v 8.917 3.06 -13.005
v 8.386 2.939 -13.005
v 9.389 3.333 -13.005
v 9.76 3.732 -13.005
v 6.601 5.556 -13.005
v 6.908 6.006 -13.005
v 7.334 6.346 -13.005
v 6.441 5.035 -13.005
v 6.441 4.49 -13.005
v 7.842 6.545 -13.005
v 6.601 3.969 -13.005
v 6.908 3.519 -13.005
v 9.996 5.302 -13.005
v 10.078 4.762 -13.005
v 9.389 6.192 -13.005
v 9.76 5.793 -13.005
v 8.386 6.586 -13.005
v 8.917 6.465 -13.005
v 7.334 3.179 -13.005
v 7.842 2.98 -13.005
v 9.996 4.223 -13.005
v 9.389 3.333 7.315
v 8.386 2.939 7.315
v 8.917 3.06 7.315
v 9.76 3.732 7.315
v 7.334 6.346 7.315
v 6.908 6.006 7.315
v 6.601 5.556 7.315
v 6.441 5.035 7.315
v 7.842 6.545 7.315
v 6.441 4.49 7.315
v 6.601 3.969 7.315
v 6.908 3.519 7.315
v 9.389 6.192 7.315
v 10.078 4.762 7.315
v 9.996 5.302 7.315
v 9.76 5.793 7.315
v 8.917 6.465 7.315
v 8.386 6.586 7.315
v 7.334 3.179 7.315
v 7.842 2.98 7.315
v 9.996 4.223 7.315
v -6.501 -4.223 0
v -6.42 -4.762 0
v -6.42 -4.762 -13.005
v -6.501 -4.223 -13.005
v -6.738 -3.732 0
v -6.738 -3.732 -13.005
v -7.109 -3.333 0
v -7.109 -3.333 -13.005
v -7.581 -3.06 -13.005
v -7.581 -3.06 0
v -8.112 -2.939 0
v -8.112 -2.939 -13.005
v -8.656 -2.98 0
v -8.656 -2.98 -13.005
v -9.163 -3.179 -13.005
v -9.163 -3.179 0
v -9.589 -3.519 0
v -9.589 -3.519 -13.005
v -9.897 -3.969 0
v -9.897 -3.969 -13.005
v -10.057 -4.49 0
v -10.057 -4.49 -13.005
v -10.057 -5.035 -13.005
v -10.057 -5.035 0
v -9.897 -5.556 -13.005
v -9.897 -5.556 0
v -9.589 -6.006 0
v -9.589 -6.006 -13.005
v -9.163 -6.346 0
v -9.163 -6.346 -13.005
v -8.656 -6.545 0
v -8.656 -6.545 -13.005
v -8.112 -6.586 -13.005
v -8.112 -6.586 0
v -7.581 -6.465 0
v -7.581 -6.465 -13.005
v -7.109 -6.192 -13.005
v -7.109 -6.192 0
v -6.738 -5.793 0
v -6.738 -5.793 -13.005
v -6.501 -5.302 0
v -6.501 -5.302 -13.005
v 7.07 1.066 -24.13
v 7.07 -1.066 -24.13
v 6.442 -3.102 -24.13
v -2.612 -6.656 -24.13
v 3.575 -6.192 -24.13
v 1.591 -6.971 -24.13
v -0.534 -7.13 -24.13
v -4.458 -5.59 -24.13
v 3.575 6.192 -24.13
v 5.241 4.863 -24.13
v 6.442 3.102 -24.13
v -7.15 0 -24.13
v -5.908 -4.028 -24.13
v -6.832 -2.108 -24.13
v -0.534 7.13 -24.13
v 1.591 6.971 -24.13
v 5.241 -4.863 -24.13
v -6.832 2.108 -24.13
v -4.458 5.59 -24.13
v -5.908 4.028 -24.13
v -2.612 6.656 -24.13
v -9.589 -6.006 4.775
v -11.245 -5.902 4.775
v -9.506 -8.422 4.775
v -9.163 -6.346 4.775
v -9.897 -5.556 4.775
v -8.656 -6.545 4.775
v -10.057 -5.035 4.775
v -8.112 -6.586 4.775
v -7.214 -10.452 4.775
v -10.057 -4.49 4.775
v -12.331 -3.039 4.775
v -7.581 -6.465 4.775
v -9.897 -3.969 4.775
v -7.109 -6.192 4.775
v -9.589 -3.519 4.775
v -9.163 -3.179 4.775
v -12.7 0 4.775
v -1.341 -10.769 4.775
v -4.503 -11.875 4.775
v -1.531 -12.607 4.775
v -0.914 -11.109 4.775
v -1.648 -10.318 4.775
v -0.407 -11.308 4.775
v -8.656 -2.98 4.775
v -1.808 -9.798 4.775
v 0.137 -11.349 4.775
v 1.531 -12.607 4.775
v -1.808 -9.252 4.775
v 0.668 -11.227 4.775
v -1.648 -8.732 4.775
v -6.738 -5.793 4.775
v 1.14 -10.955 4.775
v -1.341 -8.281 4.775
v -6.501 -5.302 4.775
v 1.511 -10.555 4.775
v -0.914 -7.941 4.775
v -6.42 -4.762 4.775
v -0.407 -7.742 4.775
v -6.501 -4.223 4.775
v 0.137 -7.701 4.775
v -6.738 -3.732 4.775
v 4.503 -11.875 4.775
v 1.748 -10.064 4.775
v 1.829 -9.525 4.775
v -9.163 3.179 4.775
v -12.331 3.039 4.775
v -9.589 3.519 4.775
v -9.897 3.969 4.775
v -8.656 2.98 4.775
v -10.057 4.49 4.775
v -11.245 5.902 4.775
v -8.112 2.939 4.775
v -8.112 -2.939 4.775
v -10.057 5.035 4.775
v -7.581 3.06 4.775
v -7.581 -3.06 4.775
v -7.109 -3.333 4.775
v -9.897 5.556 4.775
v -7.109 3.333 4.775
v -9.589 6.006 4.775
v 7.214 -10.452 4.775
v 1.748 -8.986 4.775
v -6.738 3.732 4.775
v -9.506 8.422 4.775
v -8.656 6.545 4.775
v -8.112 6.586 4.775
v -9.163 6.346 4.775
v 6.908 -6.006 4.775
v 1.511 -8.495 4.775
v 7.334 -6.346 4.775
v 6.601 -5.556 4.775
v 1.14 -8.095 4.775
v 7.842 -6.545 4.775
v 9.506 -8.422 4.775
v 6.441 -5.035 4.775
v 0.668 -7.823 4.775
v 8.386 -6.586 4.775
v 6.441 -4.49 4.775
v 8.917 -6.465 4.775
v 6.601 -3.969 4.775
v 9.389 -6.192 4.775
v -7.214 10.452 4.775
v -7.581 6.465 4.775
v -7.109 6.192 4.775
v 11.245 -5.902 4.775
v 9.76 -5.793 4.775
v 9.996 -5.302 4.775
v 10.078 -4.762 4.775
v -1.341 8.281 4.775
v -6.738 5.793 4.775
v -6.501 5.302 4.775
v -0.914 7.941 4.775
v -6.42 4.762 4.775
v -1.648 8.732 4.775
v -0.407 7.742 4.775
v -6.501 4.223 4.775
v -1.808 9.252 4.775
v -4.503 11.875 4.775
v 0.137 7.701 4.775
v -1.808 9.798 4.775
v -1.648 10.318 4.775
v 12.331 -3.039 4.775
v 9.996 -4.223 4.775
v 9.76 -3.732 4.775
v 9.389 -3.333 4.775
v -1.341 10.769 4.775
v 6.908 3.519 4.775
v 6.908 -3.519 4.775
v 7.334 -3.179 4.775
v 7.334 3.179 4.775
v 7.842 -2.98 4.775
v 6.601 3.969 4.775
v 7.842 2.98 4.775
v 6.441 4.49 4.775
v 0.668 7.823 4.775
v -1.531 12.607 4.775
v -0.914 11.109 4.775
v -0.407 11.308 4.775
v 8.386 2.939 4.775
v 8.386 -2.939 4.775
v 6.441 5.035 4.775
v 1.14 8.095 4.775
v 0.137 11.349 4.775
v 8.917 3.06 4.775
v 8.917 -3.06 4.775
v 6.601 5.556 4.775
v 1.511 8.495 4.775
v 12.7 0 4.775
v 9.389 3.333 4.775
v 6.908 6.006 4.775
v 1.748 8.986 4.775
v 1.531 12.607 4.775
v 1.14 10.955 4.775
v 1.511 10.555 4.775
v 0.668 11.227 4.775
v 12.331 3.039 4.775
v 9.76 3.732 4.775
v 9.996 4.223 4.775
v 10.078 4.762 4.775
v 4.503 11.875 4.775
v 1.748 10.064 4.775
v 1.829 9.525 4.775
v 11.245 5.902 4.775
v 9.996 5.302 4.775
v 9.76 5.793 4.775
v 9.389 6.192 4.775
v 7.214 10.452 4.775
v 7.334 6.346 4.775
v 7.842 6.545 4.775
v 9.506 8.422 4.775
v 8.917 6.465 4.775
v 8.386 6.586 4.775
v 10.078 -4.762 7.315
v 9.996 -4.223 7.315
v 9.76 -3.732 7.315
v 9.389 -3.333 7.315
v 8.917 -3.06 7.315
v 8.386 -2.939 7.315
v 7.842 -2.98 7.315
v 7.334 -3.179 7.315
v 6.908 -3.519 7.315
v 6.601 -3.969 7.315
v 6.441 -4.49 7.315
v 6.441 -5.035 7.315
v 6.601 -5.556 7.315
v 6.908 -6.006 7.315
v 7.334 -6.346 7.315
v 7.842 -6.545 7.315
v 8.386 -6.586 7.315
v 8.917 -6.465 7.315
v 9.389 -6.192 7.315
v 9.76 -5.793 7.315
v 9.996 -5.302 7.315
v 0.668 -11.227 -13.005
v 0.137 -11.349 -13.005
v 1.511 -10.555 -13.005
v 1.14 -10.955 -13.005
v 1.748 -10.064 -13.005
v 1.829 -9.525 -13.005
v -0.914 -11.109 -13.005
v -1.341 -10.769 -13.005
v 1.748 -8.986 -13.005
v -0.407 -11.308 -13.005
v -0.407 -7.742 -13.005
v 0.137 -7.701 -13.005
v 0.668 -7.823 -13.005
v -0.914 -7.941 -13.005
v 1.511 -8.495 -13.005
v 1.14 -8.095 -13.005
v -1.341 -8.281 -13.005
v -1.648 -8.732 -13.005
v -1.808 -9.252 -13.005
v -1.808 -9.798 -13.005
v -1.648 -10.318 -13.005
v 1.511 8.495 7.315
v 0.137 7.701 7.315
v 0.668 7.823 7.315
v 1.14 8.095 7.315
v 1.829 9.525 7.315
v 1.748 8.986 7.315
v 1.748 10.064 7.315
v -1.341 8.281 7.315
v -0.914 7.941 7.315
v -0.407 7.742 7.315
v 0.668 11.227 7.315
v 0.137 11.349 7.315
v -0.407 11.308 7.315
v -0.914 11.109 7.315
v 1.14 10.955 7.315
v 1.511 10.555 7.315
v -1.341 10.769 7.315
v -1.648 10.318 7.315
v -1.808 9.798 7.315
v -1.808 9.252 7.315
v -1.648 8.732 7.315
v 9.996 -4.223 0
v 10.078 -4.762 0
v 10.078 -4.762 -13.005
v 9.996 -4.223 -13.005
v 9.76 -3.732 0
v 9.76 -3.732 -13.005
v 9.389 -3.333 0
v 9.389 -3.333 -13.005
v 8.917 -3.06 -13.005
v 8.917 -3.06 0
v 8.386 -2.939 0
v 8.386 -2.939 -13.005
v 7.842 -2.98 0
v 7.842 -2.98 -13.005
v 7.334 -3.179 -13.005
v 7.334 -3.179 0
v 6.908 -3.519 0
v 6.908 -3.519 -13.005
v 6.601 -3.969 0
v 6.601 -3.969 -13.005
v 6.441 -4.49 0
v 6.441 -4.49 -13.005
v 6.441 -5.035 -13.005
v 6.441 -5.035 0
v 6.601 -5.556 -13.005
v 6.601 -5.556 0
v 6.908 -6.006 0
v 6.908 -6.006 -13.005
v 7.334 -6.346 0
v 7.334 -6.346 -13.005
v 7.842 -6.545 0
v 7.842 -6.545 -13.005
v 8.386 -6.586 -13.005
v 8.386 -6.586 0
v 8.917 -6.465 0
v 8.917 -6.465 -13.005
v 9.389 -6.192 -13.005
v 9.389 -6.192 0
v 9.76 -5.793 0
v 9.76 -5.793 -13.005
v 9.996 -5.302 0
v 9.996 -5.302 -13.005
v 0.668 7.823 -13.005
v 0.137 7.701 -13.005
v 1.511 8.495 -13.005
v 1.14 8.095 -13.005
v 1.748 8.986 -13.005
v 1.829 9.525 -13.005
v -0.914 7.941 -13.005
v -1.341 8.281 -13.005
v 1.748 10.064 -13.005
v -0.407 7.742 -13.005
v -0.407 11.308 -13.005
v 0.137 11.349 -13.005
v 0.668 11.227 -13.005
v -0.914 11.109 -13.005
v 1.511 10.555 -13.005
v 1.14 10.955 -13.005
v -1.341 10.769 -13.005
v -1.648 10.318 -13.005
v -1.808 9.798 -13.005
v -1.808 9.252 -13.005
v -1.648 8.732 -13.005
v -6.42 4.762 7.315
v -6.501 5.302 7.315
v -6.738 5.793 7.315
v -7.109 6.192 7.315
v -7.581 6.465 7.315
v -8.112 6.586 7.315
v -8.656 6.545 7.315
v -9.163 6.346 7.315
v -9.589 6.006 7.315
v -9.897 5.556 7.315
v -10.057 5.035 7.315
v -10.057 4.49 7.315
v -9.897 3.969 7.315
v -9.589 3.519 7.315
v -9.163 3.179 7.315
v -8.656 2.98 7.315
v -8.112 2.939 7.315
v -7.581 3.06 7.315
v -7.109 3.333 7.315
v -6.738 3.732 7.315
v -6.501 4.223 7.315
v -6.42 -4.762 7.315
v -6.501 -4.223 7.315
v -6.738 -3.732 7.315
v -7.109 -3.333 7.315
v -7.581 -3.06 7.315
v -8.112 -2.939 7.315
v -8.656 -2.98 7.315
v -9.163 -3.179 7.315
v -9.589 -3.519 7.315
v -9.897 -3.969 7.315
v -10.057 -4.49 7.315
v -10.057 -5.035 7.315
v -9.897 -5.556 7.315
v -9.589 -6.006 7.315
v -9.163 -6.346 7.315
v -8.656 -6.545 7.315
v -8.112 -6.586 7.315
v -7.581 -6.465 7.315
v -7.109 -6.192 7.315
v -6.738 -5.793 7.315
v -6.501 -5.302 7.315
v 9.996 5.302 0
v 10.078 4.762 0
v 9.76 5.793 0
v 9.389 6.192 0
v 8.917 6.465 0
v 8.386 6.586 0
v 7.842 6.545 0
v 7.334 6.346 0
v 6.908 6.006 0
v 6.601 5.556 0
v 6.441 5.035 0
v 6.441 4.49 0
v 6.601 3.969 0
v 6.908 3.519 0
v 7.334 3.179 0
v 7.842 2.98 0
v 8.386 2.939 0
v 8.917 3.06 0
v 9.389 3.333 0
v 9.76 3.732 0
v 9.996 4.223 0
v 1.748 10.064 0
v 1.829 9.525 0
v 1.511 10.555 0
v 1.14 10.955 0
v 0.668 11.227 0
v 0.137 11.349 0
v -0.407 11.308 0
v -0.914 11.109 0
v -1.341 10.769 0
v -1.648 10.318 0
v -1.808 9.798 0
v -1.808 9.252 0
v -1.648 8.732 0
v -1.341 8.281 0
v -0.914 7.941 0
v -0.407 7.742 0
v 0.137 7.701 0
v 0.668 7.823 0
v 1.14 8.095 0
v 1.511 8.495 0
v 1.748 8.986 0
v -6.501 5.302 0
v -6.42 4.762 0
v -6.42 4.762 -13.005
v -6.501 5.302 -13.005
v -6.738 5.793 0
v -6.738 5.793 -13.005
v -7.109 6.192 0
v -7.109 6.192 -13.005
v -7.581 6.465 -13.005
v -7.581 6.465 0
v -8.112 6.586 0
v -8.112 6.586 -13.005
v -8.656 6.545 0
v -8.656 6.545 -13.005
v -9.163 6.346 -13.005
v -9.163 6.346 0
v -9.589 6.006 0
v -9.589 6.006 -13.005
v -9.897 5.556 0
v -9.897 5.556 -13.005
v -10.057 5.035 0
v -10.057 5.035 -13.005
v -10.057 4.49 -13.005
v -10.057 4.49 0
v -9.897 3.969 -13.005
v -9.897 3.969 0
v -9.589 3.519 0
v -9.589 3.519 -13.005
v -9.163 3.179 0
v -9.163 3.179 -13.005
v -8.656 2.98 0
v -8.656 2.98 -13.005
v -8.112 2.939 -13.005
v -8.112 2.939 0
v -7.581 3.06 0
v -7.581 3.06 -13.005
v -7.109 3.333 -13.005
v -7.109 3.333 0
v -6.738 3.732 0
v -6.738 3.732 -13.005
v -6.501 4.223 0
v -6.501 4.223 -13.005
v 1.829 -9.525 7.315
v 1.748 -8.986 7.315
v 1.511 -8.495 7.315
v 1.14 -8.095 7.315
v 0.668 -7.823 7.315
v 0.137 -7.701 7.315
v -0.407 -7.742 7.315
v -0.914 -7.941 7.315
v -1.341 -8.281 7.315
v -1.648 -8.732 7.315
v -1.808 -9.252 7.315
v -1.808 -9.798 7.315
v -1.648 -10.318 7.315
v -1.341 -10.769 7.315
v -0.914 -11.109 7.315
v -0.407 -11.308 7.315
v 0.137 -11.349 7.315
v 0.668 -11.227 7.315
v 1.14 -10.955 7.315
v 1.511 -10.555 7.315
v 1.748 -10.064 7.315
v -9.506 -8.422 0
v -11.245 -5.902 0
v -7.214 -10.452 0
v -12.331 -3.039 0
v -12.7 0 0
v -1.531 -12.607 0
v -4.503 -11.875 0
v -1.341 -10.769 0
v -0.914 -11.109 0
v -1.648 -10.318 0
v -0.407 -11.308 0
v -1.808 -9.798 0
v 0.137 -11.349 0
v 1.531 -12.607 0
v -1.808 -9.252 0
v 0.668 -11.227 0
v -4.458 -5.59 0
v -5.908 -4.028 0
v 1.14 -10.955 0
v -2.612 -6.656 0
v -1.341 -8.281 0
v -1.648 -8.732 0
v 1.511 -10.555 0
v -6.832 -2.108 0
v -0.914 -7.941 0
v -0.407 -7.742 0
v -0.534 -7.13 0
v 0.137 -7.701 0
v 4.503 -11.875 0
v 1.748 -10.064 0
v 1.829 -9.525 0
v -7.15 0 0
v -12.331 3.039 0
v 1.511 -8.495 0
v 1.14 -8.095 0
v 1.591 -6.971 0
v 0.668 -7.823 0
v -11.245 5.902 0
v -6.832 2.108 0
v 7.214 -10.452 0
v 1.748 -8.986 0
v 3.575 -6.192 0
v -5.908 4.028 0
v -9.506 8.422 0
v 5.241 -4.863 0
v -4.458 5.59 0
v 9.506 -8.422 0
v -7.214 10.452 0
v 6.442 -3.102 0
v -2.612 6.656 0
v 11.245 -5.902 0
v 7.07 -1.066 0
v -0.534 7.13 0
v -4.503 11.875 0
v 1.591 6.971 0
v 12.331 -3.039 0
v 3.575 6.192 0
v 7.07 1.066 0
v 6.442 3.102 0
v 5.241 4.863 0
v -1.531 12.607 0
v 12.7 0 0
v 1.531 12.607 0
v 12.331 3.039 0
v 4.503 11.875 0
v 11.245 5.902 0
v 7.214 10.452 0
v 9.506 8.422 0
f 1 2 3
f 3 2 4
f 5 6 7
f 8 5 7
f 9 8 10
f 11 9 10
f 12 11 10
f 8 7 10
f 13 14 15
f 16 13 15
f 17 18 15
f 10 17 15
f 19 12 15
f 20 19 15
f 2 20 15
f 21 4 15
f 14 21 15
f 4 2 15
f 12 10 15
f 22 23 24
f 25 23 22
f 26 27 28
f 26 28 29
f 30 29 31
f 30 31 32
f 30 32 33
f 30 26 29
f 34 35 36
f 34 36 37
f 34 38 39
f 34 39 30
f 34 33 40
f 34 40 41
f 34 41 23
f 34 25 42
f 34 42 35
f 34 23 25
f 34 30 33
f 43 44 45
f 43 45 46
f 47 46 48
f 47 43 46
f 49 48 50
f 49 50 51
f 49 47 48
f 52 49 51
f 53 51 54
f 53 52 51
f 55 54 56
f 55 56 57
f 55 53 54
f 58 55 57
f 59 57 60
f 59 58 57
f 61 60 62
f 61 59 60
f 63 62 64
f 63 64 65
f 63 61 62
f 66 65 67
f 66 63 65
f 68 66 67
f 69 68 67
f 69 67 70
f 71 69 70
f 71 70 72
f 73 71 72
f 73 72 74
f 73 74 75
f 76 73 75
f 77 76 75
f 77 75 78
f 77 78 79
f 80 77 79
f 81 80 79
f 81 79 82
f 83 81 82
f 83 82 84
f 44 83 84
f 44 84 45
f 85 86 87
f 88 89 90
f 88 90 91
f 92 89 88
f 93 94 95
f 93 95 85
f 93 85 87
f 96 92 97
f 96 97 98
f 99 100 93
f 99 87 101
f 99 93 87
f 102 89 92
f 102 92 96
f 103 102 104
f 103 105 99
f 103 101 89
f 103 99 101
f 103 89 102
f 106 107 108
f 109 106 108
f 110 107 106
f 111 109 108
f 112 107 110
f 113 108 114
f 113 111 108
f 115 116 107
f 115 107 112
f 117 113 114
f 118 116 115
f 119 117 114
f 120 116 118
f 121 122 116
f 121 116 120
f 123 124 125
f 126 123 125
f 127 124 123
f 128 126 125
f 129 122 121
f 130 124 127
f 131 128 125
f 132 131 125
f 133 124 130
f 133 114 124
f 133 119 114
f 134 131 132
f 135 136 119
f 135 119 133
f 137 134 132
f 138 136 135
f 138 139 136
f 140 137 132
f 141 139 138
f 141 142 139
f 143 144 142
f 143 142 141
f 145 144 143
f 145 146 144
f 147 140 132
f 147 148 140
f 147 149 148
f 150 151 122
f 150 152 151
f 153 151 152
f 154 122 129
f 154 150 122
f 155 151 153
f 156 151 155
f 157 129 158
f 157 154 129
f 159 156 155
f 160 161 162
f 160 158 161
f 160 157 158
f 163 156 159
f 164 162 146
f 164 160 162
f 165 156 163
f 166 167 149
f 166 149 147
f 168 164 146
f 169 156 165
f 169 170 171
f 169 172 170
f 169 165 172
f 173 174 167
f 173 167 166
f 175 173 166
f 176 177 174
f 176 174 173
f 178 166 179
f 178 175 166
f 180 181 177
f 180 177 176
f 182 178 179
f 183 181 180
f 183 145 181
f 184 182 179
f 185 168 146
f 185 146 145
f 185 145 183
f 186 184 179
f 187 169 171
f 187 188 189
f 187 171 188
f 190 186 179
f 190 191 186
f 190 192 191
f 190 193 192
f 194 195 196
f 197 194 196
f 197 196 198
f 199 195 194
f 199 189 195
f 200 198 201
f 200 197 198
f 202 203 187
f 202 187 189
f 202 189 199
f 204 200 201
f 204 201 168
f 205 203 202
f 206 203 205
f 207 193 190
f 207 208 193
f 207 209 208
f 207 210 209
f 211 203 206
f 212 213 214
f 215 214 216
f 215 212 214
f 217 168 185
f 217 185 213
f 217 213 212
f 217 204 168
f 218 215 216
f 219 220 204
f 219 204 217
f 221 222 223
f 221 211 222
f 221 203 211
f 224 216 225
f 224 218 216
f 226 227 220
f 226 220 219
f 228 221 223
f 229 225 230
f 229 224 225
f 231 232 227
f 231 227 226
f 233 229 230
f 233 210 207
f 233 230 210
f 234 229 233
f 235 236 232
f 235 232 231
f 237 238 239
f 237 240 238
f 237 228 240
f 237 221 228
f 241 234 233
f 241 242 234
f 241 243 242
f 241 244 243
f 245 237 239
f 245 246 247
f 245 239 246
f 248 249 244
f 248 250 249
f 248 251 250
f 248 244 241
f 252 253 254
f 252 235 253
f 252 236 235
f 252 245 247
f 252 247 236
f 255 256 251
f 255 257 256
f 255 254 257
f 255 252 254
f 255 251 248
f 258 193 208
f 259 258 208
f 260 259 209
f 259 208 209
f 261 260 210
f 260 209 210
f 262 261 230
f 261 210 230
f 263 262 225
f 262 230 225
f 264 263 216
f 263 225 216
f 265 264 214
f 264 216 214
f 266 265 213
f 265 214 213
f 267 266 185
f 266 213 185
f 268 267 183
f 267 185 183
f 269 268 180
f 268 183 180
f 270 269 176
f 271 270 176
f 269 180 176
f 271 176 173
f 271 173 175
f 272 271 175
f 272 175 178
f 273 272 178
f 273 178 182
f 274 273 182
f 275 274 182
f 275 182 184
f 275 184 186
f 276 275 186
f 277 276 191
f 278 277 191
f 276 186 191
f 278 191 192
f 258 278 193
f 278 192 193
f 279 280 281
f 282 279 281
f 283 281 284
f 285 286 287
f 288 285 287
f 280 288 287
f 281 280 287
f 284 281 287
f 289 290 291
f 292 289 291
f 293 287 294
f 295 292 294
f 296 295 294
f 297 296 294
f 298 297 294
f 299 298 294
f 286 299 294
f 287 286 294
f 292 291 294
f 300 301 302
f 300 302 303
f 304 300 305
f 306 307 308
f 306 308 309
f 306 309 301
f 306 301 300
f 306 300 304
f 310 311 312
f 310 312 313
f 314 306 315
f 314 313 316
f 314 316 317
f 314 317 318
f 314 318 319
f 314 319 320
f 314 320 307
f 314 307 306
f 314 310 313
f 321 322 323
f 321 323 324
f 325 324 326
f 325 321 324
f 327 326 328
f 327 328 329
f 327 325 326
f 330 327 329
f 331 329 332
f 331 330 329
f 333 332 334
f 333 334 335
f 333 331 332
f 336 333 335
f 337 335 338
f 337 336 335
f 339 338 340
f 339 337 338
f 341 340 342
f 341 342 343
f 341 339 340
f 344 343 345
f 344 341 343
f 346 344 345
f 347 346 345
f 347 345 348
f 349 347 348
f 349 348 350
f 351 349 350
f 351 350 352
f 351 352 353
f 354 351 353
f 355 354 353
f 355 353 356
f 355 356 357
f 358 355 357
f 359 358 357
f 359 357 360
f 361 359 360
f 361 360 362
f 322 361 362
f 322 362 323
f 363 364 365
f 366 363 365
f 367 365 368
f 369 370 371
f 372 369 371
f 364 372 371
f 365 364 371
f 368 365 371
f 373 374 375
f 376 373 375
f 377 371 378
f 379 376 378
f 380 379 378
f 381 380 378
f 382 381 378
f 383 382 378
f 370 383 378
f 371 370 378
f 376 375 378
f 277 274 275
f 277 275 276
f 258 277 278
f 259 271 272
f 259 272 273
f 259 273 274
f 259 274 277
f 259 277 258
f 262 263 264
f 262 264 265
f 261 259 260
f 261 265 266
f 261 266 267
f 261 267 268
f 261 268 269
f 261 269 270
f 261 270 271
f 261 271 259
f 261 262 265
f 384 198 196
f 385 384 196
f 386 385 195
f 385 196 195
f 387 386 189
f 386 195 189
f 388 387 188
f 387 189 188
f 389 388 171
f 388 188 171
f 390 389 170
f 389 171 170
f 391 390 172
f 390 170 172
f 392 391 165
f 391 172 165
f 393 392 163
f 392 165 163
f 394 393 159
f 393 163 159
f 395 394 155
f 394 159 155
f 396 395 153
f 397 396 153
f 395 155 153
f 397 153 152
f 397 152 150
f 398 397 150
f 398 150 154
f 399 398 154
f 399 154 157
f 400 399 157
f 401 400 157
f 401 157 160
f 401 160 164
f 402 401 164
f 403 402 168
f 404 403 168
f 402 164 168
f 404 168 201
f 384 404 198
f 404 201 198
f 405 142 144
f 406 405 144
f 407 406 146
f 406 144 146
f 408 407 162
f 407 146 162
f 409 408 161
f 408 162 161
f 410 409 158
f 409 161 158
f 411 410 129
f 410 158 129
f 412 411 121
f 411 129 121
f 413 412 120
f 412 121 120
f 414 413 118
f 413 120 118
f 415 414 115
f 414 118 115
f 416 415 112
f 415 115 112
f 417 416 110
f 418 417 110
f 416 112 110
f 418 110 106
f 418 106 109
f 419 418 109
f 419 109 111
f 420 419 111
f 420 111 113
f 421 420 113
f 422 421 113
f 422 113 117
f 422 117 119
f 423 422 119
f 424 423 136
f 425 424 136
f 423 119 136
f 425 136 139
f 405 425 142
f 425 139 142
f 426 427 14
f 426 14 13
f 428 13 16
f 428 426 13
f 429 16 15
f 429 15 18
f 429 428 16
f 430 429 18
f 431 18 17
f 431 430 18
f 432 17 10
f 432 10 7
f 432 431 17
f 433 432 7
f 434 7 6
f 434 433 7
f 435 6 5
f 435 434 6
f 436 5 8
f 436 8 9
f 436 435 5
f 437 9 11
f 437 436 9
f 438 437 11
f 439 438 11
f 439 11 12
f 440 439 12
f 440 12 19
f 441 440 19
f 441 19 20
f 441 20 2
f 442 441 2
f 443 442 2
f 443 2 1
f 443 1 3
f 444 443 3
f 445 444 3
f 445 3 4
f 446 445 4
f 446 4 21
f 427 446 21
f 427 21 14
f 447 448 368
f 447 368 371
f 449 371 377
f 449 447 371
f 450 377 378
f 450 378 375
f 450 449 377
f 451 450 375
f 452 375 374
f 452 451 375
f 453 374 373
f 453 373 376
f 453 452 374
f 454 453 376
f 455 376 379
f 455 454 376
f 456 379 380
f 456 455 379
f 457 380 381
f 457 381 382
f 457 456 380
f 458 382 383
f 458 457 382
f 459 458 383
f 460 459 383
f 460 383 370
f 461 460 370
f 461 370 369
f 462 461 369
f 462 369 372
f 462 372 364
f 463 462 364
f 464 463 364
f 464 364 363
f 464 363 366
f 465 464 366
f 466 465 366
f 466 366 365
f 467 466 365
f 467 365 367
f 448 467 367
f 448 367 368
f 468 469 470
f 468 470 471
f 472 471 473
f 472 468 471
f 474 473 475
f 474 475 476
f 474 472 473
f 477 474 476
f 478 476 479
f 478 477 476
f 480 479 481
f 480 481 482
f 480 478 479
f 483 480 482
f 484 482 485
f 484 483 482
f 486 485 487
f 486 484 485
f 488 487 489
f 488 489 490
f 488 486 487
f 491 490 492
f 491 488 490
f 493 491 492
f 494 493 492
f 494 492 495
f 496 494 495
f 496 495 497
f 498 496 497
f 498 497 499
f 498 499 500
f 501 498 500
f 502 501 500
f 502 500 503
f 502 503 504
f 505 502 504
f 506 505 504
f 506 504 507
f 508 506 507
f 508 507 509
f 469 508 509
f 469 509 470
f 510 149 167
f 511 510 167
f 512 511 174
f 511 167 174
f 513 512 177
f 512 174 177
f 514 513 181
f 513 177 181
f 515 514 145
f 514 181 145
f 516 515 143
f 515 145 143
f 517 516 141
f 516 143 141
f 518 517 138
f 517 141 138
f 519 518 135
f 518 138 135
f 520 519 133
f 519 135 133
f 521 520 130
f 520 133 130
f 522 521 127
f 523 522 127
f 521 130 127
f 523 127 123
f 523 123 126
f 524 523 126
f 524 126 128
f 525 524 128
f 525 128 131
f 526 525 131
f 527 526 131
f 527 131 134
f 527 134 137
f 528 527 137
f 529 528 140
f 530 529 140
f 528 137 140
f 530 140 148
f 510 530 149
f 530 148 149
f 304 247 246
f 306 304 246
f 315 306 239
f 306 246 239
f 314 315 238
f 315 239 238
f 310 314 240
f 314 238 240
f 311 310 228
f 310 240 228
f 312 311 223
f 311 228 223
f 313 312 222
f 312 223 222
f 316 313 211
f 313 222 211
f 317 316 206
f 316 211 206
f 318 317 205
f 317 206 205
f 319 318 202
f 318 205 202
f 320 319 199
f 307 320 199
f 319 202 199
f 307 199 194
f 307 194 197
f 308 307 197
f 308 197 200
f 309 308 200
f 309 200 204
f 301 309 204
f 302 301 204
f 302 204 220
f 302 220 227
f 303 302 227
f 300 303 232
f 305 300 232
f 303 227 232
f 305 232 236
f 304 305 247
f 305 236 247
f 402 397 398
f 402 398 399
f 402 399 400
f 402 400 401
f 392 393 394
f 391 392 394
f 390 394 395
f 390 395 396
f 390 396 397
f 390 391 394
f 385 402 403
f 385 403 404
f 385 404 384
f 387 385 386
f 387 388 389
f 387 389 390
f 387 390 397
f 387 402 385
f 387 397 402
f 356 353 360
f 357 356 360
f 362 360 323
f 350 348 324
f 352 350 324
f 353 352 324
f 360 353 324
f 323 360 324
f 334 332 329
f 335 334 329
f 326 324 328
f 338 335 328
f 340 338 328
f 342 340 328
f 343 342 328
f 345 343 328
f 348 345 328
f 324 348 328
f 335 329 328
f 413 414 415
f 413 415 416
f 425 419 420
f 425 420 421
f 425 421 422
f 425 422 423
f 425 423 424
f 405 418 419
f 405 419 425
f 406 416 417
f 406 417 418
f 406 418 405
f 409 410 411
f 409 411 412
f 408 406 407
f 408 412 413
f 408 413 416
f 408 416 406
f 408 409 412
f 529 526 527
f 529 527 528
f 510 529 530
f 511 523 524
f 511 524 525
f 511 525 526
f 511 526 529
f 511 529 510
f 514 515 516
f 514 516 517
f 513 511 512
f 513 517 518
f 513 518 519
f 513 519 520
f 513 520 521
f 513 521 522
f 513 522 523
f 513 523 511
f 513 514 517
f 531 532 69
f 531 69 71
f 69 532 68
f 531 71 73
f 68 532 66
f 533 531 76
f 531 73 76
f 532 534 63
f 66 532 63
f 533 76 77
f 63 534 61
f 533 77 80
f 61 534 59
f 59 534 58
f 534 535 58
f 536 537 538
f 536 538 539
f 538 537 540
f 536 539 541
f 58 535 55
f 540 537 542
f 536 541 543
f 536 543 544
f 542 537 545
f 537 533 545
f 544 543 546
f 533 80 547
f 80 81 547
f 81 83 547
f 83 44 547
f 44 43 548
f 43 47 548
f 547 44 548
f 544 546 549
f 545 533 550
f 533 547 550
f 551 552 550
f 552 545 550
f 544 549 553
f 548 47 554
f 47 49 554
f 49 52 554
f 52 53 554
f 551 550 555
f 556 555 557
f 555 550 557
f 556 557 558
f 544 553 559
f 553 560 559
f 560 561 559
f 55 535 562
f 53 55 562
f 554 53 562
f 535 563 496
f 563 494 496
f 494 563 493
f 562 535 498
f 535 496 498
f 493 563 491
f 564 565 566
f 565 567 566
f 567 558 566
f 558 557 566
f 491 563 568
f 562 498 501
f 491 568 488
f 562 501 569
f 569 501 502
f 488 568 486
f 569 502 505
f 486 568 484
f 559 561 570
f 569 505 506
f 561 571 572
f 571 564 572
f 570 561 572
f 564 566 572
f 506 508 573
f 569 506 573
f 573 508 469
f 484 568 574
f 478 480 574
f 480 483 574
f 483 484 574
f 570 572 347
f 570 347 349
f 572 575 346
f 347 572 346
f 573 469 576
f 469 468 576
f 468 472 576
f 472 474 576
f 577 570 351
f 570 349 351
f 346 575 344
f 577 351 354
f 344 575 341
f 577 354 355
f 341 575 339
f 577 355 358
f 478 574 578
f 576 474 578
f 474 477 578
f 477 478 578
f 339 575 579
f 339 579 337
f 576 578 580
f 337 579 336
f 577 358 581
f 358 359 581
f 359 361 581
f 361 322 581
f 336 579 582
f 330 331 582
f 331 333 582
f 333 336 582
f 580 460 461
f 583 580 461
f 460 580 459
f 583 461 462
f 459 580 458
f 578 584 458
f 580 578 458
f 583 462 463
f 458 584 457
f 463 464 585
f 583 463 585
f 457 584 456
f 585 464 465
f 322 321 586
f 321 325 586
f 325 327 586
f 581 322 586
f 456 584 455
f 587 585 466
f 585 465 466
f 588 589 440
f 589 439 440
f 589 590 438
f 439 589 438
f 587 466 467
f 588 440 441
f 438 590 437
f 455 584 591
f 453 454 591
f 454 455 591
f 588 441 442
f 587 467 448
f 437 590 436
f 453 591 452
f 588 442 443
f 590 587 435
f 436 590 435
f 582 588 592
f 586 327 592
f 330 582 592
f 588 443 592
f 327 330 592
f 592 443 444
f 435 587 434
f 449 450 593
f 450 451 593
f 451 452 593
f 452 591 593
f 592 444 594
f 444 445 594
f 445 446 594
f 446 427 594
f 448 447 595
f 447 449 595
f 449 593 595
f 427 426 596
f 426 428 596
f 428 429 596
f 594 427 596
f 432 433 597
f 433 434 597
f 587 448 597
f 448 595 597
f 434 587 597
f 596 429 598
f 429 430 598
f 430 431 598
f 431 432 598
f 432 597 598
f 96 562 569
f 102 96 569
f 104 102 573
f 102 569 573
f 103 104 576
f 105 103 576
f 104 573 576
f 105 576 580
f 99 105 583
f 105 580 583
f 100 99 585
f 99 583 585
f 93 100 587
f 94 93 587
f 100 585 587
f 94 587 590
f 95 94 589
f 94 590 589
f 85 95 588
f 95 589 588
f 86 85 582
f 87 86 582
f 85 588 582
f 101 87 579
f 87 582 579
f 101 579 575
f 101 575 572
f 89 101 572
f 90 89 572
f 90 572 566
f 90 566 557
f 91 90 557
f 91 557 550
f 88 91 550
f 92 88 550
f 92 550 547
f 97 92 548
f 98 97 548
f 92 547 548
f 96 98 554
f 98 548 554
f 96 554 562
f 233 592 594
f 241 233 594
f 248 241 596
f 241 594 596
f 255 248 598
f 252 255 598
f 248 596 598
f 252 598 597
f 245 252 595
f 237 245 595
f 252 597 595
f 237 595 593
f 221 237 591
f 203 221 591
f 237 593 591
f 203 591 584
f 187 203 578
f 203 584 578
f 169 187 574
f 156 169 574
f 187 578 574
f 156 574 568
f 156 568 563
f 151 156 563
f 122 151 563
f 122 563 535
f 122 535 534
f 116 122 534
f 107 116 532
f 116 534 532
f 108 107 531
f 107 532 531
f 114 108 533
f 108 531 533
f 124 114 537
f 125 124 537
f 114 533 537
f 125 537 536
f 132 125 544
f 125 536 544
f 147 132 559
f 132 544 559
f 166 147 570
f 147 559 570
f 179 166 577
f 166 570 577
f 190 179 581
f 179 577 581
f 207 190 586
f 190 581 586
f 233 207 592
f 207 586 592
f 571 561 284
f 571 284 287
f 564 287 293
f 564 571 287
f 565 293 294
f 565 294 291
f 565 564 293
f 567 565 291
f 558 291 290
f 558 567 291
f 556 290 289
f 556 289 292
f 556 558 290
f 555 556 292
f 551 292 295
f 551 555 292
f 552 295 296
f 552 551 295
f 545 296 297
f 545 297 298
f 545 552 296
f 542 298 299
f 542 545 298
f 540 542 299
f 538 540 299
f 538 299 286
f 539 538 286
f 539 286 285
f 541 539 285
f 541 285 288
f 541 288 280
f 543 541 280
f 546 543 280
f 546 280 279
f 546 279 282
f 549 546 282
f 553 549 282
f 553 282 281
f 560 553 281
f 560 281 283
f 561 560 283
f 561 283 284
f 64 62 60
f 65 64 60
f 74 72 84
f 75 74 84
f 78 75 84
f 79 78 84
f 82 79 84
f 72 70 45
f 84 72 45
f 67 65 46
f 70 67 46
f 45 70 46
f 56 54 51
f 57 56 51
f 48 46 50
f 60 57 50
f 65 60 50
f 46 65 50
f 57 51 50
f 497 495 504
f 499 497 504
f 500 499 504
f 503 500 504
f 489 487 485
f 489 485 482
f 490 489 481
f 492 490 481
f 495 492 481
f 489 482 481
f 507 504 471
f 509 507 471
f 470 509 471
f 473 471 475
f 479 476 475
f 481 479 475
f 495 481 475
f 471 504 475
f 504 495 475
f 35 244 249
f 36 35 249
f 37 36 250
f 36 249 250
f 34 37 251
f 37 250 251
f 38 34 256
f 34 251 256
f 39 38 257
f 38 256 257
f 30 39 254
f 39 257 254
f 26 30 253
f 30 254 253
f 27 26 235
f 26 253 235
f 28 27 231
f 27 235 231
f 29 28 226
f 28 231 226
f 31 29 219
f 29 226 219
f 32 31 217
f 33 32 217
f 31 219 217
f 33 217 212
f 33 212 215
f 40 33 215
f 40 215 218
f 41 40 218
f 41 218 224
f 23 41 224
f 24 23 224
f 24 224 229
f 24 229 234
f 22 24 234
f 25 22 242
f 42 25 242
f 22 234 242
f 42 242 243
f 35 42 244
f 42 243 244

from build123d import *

# Parameters (mm, degrees)
SKETCH1_R                = 12.7
BOSS_EXTRUDE1_DEPTH      = 4.7752
SKETCH2_R                = 7.1501
BOSS_EXTRUDE2_DEPTH      = 24.13
SKETCH3_R                = 1.8288
BOSS_EXTRUDE3_DEPTH      = 2.54
BOSS_EXTRUDE3_DEPTH_BACK = 17.78


with BuildPart() as part:
    # Sketch1 → Boss-Extrude1 (new body)
    with BuildSketch(Plane.XY):
        Circle(SKETCH1_R)
    extrude(amount=BOSS_EXTRUDE1_DEPTH)

    # Sketch2 → Boss-Extrude2 (add)
    with BuildSketch(Plane(origin=(0, 0, 0), x_dir=(-1, 0, 0), z_dir=(0, 0, -1))):
        Circle(SKETCH2_R)
    extrude(amount=BOSS_EXTRUDE2_DEPTH)

    # Sketch3 → Boss-Extrude3 (add, two sides)
    with BuildSketch(Plane.XY.offset(4.7752)) as boss_extrude3_sk:
        with Locations((0, 9.525)):
            Circle(SKETCH3_R)
        with Locations((8.248891971, 4.7625)):
            Circle(SKETCH3_R)
        with Locations((8.248891971, -4.7625)):
            Circle(SKETCH3_R)
        with Locations((0, -9.525)):
            Circle(SKETCH3_R)
        with Locations((-8.248891971, -4.7625)):
            Circle(SKETCH3_R)
        with Locations((-8.248891971, 4.7625)):
            Circle(SKETCH3_R)
    extrude(amount=BOSS_EXTRUDE3_DEPTH)
    extrude(boss_extrude3_sk.sketch, amount=-BOSS_EXTRUDE3_DEPTH_BACK)


solid = part.part
